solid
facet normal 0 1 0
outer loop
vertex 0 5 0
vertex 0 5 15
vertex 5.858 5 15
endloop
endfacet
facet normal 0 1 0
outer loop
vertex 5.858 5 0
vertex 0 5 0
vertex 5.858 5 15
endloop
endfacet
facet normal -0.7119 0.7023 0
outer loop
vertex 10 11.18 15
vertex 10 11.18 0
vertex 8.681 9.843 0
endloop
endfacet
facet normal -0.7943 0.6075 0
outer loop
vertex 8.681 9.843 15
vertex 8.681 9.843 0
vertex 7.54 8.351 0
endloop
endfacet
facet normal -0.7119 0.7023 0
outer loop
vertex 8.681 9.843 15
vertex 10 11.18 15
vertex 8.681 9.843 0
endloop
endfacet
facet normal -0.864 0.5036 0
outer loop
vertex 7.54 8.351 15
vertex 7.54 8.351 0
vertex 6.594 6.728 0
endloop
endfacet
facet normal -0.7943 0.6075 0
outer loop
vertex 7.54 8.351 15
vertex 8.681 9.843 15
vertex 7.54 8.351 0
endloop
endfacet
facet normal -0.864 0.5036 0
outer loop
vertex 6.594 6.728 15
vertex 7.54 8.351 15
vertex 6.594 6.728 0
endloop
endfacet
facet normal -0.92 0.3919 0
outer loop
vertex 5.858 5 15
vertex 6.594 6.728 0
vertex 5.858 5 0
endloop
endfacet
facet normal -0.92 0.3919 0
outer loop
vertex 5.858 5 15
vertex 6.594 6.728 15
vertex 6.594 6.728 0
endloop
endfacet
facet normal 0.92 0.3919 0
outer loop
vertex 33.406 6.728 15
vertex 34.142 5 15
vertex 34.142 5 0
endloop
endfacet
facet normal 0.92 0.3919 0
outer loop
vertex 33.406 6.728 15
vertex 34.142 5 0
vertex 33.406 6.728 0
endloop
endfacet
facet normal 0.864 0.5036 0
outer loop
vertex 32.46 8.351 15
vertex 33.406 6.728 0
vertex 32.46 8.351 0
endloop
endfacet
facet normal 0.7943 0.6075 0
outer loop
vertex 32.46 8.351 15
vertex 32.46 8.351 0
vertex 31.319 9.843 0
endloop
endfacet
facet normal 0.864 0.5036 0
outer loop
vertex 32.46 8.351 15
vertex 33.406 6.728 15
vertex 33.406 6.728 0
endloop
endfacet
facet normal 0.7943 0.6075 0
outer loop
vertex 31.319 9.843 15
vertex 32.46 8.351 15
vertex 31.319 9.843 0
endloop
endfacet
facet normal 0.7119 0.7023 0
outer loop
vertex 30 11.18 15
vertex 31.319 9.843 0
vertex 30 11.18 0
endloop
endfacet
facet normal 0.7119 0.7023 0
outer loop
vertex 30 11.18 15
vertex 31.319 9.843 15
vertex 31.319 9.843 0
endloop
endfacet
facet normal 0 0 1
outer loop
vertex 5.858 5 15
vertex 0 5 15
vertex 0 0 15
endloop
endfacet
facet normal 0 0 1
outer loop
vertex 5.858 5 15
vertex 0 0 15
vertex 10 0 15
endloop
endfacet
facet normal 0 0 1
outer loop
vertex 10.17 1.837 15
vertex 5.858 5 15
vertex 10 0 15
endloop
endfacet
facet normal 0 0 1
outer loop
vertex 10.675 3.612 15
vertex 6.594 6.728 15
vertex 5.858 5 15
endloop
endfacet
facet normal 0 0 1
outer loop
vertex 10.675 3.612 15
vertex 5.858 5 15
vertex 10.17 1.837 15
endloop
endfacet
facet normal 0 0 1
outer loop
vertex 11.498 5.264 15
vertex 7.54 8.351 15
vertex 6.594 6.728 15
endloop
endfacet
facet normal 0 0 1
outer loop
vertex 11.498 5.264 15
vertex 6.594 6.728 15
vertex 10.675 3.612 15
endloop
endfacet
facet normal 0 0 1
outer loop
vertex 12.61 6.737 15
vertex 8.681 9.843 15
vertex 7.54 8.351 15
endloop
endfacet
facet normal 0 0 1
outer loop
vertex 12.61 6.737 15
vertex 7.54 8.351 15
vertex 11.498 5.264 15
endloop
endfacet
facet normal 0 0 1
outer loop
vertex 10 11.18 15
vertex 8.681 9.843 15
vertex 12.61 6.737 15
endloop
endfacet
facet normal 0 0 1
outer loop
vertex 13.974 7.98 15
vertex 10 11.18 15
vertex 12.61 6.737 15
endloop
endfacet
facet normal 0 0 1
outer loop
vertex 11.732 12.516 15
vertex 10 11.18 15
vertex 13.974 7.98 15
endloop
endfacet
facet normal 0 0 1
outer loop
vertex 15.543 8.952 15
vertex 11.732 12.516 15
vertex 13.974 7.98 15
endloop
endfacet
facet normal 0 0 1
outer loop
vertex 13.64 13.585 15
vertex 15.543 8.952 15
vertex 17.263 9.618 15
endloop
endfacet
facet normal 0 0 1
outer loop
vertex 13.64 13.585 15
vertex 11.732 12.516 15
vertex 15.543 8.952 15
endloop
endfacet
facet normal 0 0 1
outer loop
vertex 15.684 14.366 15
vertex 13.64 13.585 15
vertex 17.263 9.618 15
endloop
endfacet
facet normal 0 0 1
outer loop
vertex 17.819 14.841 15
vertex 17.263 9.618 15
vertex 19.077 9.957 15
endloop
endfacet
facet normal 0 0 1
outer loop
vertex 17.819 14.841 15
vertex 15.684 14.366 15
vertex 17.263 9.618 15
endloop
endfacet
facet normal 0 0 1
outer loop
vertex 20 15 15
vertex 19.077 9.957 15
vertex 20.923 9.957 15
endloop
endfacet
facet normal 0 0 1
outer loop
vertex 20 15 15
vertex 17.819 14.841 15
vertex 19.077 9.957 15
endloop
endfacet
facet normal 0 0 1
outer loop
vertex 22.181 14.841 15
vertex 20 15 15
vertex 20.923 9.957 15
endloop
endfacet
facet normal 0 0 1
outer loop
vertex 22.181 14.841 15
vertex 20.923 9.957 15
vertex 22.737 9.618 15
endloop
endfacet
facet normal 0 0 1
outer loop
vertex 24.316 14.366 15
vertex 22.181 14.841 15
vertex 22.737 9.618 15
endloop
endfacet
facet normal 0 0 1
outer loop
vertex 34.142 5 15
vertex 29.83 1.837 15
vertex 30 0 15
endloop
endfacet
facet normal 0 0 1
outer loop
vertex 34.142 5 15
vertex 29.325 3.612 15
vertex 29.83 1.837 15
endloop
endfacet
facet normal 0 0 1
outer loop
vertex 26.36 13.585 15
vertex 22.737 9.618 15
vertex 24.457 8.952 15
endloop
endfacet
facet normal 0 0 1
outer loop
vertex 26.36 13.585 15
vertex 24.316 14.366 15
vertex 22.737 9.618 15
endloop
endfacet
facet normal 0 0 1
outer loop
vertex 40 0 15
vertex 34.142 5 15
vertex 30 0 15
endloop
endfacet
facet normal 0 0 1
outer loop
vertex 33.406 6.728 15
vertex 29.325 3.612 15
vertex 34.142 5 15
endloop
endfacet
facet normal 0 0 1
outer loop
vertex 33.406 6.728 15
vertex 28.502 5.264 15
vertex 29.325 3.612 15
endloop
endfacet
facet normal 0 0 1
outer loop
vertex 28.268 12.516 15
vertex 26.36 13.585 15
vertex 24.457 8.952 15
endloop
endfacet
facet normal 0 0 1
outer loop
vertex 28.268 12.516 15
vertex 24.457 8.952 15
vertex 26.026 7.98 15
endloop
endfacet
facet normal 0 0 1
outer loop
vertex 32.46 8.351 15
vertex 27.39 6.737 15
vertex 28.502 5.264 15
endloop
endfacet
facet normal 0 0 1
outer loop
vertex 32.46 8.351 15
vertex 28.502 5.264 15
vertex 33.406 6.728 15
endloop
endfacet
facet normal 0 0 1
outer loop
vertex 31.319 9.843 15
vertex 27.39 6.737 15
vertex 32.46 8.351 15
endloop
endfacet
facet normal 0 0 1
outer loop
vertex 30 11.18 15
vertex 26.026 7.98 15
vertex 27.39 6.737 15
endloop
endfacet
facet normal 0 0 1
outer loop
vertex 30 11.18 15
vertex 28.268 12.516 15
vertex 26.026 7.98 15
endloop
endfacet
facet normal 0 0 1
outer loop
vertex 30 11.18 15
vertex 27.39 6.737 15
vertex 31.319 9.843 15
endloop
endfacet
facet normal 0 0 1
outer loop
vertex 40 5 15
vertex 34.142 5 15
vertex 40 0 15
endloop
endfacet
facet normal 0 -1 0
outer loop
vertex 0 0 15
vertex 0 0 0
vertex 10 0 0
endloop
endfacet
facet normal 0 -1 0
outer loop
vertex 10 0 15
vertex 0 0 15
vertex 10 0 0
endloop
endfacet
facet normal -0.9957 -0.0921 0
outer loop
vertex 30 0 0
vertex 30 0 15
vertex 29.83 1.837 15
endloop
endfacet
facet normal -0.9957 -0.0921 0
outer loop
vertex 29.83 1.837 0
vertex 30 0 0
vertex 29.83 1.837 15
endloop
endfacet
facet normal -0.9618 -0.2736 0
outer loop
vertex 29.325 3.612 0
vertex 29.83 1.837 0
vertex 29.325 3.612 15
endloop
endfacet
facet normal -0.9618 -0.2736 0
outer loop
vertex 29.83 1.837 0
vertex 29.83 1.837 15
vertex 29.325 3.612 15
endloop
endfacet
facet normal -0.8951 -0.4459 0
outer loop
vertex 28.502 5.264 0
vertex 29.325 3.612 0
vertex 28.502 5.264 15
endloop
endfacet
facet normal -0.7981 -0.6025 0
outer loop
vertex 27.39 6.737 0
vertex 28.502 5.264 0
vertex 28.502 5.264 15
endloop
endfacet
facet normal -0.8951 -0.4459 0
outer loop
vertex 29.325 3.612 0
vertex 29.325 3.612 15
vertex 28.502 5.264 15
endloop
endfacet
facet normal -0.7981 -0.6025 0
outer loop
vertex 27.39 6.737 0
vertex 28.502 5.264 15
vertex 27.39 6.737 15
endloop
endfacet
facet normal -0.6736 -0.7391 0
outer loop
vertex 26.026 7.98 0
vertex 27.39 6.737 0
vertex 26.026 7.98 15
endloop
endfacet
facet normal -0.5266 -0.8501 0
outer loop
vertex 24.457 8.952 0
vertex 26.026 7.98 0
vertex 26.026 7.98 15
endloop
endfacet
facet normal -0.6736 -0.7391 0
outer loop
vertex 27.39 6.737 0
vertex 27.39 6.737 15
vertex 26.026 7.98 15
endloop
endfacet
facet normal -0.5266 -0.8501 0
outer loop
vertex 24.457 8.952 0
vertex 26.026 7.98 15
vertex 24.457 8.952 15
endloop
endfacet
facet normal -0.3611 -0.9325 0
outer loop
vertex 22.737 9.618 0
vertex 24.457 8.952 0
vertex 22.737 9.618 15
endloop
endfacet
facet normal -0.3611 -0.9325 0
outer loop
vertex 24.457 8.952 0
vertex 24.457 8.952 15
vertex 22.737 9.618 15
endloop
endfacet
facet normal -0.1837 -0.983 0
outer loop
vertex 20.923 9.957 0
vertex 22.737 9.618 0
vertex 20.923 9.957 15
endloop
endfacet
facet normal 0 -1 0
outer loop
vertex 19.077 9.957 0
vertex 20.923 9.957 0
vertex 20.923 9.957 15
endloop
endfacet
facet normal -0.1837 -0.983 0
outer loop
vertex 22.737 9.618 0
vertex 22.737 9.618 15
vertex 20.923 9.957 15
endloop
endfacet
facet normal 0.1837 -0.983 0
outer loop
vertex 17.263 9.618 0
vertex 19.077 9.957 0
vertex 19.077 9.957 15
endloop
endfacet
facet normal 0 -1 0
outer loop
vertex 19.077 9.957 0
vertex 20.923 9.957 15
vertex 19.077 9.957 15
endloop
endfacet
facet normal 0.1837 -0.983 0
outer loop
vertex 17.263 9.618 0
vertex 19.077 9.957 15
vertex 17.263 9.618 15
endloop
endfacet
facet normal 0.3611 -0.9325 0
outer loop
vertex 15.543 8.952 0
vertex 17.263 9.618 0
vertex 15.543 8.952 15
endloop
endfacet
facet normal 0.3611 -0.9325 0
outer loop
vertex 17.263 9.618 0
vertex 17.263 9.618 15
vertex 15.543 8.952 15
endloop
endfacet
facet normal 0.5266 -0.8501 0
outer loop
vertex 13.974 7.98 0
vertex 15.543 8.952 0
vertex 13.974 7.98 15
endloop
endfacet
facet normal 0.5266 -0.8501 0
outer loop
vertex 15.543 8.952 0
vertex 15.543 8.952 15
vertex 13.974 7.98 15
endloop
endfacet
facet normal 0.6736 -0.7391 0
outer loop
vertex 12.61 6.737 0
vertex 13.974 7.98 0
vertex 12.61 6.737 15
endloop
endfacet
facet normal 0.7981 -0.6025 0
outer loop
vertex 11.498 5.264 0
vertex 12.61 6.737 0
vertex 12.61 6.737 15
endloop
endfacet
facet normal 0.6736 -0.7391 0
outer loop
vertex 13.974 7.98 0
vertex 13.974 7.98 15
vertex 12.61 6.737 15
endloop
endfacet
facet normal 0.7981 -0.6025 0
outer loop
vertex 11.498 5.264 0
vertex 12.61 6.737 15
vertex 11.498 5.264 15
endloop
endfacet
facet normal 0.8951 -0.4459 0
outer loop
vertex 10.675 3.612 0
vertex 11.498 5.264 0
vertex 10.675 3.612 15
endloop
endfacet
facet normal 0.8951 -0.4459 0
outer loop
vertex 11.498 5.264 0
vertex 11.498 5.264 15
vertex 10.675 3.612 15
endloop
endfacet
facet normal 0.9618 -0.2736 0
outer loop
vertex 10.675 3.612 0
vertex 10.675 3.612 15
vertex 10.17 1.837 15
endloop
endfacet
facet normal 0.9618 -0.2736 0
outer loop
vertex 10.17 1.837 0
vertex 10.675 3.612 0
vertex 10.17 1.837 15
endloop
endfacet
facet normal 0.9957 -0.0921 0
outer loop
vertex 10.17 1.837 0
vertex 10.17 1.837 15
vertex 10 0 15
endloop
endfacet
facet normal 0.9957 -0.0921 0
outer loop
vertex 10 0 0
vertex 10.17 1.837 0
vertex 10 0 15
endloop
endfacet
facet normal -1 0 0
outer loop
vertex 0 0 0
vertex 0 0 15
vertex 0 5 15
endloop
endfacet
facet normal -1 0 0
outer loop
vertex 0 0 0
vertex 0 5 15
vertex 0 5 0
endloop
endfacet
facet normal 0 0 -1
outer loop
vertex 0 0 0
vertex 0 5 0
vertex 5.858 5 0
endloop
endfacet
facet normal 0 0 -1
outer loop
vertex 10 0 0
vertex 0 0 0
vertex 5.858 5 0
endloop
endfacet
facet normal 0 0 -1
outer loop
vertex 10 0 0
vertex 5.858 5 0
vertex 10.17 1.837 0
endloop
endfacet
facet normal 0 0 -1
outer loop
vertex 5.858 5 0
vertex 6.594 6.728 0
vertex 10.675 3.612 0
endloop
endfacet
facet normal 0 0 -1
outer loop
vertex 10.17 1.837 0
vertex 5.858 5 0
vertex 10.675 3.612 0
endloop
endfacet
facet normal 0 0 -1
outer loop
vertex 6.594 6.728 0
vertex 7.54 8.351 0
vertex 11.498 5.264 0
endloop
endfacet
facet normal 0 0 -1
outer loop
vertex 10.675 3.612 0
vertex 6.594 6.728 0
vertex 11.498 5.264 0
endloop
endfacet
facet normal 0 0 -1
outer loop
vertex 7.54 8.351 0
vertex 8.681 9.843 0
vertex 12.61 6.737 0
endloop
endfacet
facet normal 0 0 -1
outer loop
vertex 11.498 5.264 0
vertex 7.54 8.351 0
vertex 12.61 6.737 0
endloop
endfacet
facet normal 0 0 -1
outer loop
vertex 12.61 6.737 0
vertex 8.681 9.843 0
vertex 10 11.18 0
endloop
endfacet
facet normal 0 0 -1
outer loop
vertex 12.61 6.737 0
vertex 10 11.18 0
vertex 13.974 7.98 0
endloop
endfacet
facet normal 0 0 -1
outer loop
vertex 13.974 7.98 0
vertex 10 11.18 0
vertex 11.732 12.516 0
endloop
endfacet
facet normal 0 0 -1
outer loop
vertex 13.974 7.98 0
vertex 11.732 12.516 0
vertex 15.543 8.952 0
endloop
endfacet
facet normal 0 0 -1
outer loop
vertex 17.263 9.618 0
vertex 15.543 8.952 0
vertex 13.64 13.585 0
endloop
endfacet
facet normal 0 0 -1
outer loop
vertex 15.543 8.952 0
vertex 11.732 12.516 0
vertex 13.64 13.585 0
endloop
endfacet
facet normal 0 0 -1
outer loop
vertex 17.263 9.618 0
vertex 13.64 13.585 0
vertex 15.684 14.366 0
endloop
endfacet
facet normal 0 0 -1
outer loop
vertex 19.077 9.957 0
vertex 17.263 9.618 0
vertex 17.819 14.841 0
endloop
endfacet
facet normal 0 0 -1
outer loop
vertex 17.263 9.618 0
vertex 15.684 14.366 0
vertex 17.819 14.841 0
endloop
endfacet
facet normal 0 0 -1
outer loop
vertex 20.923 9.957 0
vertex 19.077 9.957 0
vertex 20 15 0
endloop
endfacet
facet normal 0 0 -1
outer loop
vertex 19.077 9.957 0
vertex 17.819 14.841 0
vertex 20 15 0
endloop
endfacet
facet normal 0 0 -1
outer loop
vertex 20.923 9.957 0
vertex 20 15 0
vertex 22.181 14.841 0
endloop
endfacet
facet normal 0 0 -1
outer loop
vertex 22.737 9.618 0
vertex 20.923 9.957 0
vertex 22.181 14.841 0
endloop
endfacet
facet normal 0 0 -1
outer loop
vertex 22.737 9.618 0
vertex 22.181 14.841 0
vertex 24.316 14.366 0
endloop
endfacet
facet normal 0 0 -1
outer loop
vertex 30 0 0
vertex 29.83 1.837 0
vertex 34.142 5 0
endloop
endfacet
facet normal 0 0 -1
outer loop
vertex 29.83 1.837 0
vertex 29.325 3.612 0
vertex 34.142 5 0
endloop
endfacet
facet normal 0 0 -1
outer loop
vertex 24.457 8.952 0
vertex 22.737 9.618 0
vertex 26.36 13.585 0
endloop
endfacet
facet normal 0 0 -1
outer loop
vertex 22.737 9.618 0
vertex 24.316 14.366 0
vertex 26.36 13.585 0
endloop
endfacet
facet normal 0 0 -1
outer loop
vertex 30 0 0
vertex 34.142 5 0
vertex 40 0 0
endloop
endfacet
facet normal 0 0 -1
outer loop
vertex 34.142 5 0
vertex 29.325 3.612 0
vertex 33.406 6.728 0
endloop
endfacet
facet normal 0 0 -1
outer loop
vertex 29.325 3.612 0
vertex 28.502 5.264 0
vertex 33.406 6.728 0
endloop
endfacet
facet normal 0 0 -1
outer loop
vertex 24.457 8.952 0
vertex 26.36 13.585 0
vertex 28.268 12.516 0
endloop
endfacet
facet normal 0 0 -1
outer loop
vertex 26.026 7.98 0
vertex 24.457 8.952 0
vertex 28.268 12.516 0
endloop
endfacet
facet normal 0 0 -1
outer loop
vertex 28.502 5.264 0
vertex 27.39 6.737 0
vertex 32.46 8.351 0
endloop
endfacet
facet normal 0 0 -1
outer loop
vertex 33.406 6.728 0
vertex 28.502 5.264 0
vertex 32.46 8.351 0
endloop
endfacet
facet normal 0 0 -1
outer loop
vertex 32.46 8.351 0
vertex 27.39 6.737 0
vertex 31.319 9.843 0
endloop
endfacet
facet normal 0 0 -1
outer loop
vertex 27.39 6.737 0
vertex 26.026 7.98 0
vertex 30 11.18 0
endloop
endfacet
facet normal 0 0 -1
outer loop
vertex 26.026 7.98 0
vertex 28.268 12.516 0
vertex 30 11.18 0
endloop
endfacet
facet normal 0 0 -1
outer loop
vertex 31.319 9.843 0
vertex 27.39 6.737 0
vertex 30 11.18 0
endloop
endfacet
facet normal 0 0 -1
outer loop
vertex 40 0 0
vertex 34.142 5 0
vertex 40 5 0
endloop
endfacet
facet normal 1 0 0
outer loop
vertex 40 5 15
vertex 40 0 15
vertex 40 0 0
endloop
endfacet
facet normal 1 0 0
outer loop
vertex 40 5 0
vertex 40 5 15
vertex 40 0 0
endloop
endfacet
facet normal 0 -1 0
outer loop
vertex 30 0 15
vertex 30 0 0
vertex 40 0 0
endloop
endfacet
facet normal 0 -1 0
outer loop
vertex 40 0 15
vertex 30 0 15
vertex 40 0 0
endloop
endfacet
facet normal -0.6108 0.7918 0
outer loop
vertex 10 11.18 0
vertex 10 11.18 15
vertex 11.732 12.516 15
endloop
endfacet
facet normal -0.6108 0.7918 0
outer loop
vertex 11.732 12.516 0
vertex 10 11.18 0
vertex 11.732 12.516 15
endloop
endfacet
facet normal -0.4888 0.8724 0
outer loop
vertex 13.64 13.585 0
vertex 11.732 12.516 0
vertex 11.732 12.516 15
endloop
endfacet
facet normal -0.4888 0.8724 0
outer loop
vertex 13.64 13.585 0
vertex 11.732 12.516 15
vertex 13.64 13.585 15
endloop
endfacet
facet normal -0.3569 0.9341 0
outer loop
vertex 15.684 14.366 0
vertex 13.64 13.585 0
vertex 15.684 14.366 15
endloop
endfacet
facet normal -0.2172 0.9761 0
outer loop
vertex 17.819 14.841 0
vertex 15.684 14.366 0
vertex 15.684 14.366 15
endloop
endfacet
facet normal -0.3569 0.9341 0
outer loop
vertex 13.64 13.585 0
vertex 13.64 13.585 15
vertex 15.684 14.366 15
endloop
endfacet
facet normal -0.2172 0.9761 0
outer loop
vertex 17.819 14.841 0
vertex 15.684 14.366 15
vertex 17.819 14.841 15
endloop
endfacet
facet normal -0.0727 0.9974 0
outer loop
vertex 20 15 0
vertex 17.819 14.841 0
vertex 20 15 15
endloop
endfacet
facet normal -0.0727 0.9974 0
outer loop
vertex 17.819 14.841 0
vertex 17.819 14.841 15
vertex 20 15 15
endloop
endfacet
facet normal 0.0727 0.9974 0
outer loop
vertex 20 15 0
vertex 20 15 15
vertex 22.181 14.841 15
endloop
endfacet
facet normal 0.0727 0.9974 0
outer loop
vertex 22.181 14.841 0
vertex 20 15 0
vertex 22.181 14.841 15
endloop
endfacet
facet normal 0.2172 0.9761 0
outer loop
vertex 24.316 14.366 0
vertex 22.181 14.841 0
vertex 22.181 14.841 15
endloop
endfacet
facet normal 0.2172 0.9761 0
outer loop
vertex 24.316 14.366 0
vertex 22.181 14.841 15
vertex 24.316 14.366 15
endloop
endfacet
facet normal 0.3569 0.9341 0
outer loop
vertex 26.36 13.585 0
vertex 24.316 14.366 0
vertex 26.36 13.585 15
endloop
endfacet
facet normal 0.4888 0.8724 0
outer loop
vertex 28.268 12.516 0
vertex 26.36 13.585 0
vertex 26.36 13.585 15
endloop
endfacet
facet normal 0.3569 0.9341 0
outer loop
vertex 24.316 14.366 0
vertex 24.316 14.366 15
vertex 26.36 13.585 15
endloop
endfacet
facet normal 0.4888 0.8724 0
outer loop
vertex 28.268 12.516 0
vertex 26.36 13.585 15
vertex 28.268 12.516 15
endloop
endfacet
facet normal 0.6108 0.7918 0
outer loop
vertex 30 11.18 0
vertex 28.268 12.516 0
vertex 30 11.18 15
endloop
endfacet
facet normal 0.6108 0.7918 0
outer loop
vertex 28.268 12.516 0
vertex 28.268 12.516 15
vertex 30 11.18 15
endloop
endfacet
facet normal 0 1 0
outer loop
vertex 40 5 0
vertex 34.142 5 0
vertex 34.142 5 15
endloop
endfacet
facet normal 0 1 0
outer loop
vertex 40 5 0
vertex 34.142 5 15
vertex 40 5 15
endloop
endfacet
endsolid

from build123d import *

# Parameters (mm, degrees)
CROQUIS1_W              = 40
CROQUIS1_H              = 15
SALIENTE_EXTRUIR1_DEPTH = 15
CROQUIS2_W              = 10
CROQUIS2_H              = 10
CORTAR_EXTRUIR2_DEPTH   = 15
CORTAR_EXTRUIR3_DEPTH   = 15
CORTAR_EXTRUIR4_DEPTH   = 15
SALIENTE_EXTRUIR2_DEPTH = 15


with BuildPart() as part:
    # Croquis1 → Saliente-Extruir1 (new body)
    with BuildSketch(Plane(origin=(0, 0, 0), x_dir=(1, 0, 0), z_dir=(0, 1, 0))):
        with Locations((20, -7.5)):
            Rectangle(CROQUIS1_W, CROQUIS1_H)
    extrude(amount=SALIENTE_EXTRUIR1_DEPTH)

    # Croquis2 → Cortar-Extruir2 (cut)
    with BuildSketch(Plane.XY.offset(15)):
        with Locations((5, 10)):
            Rectangle(CROQUIS2_W, CROQUIS2_H)
        with Locations((35, 10)):
            Rectangle(CROQUIS2_W, CROQUIS2_H)
    extrude(amount=-CORTAR_EXTRUIR2_DEPTH, mode=Mode.SUBTRACT)

    # Croquis5 → Cortar-Extruir3 (cut)
    with BuildSketch(Plane.XY.offset(15)):
        with BuildLine():
            ThreePointArc((30, 0), (20, 10), (10, 0))
            Line((10, 0), (30, 0))
        make_face()
        with BuildLine():
            Line((30, 0), (10, 0))
            ThreePointArc((10, 0), (20, -10), (30, 0))
        make_face()
    extrude(amount=-CORTAR_EXTRUIR3_DEPTH, mode=Mode.SUBTRACT)

    # Croquis6 → Cortar-Extruir4 (cut)
    with BuildSketch(Plane.XY.offset(15)):
        with BuildLine():
            Line((20, 15), (10, 15))
            Line((10, 15), (10, 11.180339887))
            ThreePointArc((10, 11.180339887), (14.647668653, 14.012585384), (20, 15))
        make_face()
        with BuildLine():
            Line((30, 15), (20, 15))
            ThreePointArc((20, 15), (25.352331347, 14.012585384), (30, 11.180339887))
            Line((30, 11.180339887), (30, 15))
        make_face()
    extrude(amount=-CORTAR_EXTRUIR4_DEPTH, mode=Mode.SUBTRACT)

    # Croquis7 → Saliente-Extruir2 (add)
    with BuildSketch(Plane.XY.offset(15)):
        with BuildLine():
            ThreePointArc((10, 11.180339887), (7.539669812, 8.351058113), (5.857864376, 5))
            Line((5.857864376, 5), (10, 5))
            Line((10, 5), (10, 11.180339887))
        make_face()
        with BuildLine():
            Line((30, 5), (34.142135624, 5))
            ThreePointArc((34.142135624, 5), (32.460330188, 8.351058113), (30, 11.180339887))
            Line((30, 11.180339887), (30, 5))
        make_face()
    extrude(amount=-SALIENTE_EXTRUIR2_DEPTH)


solid = part.part
